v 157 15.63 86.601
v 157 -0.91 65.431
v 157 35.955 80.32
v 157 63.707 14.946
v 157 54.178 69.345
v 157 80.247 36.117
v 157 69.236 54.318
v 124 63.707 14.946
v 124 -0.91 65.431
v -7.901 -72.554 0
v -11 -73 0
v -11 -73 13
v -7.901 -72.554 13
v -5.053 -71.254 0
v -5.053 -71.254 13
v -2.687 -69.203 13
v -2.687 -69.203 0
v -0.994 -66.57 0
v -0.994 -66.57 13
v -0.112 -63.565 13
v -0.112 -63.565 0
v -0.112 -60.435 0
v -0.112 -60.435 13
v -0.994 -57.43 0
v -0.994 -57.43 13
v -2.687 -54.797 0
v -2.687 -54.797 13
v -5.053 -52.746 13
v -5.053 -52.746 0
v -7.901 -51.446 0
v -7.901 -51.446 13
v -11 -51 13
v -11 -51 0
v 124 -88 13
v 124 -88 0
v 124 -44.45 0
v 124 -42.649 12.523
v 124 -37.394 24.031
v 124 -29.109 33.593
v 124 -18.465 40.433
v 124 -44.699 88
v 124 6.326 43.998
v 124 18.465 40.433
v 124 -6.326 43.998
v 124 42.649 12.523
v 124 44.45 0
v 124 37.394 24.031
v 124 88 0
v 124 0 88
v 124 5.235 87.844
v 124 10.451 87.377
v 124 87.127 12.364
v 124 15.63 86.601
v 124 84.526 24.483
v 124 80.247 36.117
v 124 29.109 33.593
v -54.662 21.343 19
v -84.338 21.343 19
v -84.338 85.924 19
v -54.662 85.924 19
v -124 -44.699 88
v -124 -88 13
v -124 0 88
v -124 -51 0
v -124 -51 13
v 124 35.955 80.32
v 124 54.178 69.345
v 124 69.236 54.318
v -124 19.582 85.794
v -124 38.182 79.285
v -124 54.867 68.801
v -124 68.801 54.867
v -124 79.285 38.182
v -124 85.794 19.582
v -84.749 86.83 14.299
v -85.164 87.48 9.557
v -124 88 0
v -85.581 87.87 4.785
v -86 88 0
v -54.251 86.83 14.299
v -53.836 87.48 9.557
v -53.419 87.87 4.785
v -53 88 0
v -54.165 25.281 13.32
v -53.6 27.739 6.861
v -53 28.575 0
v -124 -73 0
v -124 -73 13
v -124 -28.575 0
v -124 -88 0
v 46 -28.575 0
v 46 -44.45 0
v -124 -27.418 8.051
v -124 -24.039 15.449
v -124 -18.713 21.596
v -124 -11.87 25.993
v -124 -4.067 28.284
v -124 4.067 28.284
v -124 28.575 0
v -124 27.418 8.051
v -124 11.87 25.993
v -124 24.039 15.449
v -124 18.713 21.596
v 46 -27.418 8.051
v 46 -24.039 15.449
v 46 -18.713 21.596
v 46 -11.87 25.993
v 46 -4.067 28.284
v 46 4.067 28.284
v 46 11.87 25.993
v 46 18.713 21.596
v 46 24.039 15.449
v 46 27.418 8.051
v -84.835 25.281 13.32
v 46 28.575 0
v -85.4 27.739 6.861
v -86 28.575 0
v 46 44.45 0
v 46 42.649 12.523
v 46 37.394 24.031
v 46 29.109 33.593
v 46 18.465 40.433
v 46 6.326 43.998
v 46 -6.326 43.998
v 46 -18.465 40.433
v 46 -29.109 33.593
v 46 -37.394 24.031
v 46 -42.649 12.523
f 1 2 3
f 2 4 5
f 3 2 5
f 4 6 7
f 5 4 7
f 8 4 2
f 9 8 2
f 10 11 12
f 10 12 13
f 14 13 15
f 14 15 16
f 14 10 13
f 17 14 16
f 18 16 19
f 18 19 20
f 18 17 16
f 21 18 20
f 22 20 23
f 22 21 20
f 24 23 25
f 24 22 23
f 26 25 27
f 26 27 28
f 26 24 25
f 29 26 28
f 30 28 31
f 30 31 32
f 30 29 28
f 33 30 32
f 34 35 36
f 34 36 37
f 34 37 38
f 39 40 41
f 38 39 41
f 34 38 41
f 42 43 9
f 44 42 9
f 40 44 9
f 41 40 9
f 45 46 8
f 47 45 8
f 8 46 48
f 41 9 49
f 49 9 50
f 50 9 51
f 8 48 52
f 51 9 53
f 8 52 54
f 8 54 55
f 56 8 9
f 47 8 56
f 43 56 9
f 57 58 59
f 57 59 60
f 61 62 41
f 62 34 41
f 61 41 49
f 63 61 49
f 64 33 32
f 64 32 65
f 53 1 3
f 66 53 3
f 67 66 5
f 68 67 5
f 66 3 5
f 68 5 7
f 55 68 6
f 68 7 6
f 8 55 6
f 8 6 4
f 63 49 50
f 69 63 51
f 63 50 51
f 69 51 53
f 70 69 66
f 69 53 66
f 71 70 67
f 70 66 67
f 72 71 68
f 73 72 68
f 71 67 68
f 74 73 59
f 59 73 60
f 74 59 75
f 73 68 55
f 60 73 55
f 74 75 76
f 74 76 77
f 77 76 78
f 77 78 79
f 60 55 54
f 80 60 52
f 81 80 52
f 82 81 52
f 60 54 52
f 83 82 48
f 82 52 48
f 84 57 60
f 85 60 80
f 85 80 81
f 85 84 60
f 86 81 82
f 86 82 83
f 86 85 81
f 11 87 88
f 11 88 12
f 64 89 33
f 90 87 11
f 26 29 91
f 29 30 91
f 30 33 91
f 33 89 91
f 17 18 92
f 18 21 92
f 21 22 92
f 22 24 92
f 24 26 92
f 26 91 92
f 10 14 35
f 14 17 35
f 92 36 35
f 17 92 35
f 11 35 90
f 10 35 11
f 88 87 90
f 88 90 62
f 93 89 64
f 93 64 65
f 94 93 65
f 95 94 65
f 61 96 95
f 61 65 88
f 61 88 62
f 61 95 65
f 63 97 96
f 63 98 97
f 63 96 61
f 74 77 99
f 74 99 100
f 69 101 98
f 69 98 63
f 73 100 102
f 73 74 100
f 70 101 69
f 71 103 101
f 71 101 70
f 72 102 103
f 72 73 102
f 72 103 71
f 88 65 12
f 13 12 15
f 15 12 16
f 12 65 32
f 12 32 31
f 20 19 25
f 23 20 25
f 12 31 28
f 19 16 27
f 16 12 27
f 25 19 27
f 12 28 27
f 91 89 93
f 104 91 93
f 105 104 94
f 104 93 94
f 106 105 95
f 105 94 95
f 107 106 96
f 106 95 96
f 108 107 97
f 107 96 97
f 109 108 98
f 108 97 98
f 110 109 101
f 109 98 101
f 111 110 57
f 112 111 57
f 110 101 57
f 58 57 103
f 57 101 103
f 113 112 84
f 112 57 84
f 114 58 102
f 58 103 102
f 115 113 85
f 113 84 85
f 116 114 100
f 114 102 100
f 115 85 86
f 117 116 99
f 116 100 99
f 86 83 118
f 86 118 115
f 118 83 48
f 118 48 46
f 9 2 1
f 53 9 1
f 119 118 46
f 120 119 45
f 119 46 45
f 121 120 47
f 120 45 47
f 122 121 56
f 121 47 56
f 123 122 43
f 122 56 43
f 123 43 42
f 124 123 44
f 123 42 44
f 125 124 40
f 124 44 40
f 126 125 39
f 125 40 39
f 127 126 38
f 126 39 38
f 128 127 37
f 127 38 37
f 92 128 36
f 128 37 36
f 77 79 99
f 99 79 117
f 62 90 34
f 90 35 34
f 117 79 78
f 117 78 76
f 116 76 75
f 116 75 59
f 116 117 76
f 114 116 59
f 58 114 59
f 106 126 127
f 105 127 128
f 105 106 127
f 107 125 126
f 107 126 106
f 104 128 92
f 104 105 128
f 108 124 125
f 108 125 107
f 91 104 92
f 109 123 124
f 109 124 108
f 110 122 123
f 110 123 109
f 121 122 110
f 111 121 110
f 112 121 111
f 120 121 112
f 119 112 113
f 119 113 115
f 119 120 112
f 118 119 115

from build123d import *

# Parameters (mm, degrees)
BOSS_EXTRUDE1_DEPTH = 124
SKETCH2_R           = 44.45
CUT_EXTRUDE1_DEPTH  = 78
SKETCH3_R           = 28.575
CUT_EXTRUDE2_DEPTH  = 170
CUT_EXTRUDE3_DEPTH  = 13
CUT_EXTRUDE4_DEPTH  = 176.681530048
BOSS_EXTRUDE2_START = 33
BOSS_EXTRUDE2_DEPTH = 33


with BuildPart() as part:
    # Sketch1 → Boss-Extrude1 (new, symmetric)
    with BuildSketch(Plane(origin=(0, 0, 0), x_dir=(0, 0, -1), z_dir=(1, 0, 0))):
        with BuildLine():
            Line((0, 88), (0, -88))
            Line((0, -88), (-13, -88))
            Line((-13, -88), (-88, -44.698729811))
            Line((-88, -44.698729811), (-88, 0))
            ThreePointArc((-88, 0), (-62.225396744, 62.225396744), (0, 88))
        make_face()
    extrude(amount=BOSS_EXTRUDE1_DEPTH, both=True)

    # Sketch2 → Cut-Extrude1 (cut)
    with BuildSketch(Plane(origin=(124, 0, 0), x_dir=(0, 0, -1), z_dir=(1, 0, 0))):
        Circle(SKETCH2_R)
    extrude(amount=-CUT_EXTRUDE1_DEPTH, mode=Mode.SUBTRACT)

    # Sketch3 → Cut-Extrude2 (cut)
    with BuildSketch(Plane.ZY.offset(124)):
        Circle(SKETCH3_R)
    extrude(amount=-CUT_EXTRUDE2_DEPTH, mode=Mode.SUBTRACT)

    # Sketch4 → Cut-Extrude3 (cut)
    with BuildSketch(Plane(origin=(0, 0, 0), x_dir=(-1, 0, 0), z_dir=(0, 0, -1))):
        with BuildLine():
            Line((124, -73), (11, -73))
            ThreePointArc((11, -73), (0, -62), (11, -51))
            Line((11, -51), (124, -51))
            Line((124, -51), (124, -73))
        make_face()
    extrude(amount=-CUT_EXTRUDE3_DEPTH, mode=Mode.SUBTRACT)

    # Sketch5 → Cut-Extrude4 (cut, through all)
    with BuildSketch(Plane(origin=(0, 0, 0), x_dir=(1, 0, 0), z_dir=(0, 1, 0))):
        Polygon((-53, 0), (-86, 0), (-84.337715393, -19), (-54.662284607, -19), align=None)
    extrude(amount=CUT_EXTRUDE4_DEPTH, mode=Mode.SUBTRACT)

    # Sketch6 → Boss-Extrude2 (add)
    with BuildSketch(Plane(origin=(124, 0, 0), x_dir=(0, 0, -1), z_dir=(1, 0, 0)).offset(BOSS_EXTRUDE2_START)):
        with BuildLine():
            Line((-36.116548227, 80.247086827), (-14.946427946, 63.707176139))
            Line((-14.946427946, 63.707176139), (-65.430668922, -0.909705656))
            Line((-65.430668922, -0.909705656), (-86.600789204, 15.630205031))
            ThreePointArc((-86.600789204, 15.630205031), (-69.344946317, 54.178209829), (-36.116548227, 80.247086827))
        make_face()
    extrude(amount=-BOSS_EXTRUDE2_DEPTH)


solid = part.part
